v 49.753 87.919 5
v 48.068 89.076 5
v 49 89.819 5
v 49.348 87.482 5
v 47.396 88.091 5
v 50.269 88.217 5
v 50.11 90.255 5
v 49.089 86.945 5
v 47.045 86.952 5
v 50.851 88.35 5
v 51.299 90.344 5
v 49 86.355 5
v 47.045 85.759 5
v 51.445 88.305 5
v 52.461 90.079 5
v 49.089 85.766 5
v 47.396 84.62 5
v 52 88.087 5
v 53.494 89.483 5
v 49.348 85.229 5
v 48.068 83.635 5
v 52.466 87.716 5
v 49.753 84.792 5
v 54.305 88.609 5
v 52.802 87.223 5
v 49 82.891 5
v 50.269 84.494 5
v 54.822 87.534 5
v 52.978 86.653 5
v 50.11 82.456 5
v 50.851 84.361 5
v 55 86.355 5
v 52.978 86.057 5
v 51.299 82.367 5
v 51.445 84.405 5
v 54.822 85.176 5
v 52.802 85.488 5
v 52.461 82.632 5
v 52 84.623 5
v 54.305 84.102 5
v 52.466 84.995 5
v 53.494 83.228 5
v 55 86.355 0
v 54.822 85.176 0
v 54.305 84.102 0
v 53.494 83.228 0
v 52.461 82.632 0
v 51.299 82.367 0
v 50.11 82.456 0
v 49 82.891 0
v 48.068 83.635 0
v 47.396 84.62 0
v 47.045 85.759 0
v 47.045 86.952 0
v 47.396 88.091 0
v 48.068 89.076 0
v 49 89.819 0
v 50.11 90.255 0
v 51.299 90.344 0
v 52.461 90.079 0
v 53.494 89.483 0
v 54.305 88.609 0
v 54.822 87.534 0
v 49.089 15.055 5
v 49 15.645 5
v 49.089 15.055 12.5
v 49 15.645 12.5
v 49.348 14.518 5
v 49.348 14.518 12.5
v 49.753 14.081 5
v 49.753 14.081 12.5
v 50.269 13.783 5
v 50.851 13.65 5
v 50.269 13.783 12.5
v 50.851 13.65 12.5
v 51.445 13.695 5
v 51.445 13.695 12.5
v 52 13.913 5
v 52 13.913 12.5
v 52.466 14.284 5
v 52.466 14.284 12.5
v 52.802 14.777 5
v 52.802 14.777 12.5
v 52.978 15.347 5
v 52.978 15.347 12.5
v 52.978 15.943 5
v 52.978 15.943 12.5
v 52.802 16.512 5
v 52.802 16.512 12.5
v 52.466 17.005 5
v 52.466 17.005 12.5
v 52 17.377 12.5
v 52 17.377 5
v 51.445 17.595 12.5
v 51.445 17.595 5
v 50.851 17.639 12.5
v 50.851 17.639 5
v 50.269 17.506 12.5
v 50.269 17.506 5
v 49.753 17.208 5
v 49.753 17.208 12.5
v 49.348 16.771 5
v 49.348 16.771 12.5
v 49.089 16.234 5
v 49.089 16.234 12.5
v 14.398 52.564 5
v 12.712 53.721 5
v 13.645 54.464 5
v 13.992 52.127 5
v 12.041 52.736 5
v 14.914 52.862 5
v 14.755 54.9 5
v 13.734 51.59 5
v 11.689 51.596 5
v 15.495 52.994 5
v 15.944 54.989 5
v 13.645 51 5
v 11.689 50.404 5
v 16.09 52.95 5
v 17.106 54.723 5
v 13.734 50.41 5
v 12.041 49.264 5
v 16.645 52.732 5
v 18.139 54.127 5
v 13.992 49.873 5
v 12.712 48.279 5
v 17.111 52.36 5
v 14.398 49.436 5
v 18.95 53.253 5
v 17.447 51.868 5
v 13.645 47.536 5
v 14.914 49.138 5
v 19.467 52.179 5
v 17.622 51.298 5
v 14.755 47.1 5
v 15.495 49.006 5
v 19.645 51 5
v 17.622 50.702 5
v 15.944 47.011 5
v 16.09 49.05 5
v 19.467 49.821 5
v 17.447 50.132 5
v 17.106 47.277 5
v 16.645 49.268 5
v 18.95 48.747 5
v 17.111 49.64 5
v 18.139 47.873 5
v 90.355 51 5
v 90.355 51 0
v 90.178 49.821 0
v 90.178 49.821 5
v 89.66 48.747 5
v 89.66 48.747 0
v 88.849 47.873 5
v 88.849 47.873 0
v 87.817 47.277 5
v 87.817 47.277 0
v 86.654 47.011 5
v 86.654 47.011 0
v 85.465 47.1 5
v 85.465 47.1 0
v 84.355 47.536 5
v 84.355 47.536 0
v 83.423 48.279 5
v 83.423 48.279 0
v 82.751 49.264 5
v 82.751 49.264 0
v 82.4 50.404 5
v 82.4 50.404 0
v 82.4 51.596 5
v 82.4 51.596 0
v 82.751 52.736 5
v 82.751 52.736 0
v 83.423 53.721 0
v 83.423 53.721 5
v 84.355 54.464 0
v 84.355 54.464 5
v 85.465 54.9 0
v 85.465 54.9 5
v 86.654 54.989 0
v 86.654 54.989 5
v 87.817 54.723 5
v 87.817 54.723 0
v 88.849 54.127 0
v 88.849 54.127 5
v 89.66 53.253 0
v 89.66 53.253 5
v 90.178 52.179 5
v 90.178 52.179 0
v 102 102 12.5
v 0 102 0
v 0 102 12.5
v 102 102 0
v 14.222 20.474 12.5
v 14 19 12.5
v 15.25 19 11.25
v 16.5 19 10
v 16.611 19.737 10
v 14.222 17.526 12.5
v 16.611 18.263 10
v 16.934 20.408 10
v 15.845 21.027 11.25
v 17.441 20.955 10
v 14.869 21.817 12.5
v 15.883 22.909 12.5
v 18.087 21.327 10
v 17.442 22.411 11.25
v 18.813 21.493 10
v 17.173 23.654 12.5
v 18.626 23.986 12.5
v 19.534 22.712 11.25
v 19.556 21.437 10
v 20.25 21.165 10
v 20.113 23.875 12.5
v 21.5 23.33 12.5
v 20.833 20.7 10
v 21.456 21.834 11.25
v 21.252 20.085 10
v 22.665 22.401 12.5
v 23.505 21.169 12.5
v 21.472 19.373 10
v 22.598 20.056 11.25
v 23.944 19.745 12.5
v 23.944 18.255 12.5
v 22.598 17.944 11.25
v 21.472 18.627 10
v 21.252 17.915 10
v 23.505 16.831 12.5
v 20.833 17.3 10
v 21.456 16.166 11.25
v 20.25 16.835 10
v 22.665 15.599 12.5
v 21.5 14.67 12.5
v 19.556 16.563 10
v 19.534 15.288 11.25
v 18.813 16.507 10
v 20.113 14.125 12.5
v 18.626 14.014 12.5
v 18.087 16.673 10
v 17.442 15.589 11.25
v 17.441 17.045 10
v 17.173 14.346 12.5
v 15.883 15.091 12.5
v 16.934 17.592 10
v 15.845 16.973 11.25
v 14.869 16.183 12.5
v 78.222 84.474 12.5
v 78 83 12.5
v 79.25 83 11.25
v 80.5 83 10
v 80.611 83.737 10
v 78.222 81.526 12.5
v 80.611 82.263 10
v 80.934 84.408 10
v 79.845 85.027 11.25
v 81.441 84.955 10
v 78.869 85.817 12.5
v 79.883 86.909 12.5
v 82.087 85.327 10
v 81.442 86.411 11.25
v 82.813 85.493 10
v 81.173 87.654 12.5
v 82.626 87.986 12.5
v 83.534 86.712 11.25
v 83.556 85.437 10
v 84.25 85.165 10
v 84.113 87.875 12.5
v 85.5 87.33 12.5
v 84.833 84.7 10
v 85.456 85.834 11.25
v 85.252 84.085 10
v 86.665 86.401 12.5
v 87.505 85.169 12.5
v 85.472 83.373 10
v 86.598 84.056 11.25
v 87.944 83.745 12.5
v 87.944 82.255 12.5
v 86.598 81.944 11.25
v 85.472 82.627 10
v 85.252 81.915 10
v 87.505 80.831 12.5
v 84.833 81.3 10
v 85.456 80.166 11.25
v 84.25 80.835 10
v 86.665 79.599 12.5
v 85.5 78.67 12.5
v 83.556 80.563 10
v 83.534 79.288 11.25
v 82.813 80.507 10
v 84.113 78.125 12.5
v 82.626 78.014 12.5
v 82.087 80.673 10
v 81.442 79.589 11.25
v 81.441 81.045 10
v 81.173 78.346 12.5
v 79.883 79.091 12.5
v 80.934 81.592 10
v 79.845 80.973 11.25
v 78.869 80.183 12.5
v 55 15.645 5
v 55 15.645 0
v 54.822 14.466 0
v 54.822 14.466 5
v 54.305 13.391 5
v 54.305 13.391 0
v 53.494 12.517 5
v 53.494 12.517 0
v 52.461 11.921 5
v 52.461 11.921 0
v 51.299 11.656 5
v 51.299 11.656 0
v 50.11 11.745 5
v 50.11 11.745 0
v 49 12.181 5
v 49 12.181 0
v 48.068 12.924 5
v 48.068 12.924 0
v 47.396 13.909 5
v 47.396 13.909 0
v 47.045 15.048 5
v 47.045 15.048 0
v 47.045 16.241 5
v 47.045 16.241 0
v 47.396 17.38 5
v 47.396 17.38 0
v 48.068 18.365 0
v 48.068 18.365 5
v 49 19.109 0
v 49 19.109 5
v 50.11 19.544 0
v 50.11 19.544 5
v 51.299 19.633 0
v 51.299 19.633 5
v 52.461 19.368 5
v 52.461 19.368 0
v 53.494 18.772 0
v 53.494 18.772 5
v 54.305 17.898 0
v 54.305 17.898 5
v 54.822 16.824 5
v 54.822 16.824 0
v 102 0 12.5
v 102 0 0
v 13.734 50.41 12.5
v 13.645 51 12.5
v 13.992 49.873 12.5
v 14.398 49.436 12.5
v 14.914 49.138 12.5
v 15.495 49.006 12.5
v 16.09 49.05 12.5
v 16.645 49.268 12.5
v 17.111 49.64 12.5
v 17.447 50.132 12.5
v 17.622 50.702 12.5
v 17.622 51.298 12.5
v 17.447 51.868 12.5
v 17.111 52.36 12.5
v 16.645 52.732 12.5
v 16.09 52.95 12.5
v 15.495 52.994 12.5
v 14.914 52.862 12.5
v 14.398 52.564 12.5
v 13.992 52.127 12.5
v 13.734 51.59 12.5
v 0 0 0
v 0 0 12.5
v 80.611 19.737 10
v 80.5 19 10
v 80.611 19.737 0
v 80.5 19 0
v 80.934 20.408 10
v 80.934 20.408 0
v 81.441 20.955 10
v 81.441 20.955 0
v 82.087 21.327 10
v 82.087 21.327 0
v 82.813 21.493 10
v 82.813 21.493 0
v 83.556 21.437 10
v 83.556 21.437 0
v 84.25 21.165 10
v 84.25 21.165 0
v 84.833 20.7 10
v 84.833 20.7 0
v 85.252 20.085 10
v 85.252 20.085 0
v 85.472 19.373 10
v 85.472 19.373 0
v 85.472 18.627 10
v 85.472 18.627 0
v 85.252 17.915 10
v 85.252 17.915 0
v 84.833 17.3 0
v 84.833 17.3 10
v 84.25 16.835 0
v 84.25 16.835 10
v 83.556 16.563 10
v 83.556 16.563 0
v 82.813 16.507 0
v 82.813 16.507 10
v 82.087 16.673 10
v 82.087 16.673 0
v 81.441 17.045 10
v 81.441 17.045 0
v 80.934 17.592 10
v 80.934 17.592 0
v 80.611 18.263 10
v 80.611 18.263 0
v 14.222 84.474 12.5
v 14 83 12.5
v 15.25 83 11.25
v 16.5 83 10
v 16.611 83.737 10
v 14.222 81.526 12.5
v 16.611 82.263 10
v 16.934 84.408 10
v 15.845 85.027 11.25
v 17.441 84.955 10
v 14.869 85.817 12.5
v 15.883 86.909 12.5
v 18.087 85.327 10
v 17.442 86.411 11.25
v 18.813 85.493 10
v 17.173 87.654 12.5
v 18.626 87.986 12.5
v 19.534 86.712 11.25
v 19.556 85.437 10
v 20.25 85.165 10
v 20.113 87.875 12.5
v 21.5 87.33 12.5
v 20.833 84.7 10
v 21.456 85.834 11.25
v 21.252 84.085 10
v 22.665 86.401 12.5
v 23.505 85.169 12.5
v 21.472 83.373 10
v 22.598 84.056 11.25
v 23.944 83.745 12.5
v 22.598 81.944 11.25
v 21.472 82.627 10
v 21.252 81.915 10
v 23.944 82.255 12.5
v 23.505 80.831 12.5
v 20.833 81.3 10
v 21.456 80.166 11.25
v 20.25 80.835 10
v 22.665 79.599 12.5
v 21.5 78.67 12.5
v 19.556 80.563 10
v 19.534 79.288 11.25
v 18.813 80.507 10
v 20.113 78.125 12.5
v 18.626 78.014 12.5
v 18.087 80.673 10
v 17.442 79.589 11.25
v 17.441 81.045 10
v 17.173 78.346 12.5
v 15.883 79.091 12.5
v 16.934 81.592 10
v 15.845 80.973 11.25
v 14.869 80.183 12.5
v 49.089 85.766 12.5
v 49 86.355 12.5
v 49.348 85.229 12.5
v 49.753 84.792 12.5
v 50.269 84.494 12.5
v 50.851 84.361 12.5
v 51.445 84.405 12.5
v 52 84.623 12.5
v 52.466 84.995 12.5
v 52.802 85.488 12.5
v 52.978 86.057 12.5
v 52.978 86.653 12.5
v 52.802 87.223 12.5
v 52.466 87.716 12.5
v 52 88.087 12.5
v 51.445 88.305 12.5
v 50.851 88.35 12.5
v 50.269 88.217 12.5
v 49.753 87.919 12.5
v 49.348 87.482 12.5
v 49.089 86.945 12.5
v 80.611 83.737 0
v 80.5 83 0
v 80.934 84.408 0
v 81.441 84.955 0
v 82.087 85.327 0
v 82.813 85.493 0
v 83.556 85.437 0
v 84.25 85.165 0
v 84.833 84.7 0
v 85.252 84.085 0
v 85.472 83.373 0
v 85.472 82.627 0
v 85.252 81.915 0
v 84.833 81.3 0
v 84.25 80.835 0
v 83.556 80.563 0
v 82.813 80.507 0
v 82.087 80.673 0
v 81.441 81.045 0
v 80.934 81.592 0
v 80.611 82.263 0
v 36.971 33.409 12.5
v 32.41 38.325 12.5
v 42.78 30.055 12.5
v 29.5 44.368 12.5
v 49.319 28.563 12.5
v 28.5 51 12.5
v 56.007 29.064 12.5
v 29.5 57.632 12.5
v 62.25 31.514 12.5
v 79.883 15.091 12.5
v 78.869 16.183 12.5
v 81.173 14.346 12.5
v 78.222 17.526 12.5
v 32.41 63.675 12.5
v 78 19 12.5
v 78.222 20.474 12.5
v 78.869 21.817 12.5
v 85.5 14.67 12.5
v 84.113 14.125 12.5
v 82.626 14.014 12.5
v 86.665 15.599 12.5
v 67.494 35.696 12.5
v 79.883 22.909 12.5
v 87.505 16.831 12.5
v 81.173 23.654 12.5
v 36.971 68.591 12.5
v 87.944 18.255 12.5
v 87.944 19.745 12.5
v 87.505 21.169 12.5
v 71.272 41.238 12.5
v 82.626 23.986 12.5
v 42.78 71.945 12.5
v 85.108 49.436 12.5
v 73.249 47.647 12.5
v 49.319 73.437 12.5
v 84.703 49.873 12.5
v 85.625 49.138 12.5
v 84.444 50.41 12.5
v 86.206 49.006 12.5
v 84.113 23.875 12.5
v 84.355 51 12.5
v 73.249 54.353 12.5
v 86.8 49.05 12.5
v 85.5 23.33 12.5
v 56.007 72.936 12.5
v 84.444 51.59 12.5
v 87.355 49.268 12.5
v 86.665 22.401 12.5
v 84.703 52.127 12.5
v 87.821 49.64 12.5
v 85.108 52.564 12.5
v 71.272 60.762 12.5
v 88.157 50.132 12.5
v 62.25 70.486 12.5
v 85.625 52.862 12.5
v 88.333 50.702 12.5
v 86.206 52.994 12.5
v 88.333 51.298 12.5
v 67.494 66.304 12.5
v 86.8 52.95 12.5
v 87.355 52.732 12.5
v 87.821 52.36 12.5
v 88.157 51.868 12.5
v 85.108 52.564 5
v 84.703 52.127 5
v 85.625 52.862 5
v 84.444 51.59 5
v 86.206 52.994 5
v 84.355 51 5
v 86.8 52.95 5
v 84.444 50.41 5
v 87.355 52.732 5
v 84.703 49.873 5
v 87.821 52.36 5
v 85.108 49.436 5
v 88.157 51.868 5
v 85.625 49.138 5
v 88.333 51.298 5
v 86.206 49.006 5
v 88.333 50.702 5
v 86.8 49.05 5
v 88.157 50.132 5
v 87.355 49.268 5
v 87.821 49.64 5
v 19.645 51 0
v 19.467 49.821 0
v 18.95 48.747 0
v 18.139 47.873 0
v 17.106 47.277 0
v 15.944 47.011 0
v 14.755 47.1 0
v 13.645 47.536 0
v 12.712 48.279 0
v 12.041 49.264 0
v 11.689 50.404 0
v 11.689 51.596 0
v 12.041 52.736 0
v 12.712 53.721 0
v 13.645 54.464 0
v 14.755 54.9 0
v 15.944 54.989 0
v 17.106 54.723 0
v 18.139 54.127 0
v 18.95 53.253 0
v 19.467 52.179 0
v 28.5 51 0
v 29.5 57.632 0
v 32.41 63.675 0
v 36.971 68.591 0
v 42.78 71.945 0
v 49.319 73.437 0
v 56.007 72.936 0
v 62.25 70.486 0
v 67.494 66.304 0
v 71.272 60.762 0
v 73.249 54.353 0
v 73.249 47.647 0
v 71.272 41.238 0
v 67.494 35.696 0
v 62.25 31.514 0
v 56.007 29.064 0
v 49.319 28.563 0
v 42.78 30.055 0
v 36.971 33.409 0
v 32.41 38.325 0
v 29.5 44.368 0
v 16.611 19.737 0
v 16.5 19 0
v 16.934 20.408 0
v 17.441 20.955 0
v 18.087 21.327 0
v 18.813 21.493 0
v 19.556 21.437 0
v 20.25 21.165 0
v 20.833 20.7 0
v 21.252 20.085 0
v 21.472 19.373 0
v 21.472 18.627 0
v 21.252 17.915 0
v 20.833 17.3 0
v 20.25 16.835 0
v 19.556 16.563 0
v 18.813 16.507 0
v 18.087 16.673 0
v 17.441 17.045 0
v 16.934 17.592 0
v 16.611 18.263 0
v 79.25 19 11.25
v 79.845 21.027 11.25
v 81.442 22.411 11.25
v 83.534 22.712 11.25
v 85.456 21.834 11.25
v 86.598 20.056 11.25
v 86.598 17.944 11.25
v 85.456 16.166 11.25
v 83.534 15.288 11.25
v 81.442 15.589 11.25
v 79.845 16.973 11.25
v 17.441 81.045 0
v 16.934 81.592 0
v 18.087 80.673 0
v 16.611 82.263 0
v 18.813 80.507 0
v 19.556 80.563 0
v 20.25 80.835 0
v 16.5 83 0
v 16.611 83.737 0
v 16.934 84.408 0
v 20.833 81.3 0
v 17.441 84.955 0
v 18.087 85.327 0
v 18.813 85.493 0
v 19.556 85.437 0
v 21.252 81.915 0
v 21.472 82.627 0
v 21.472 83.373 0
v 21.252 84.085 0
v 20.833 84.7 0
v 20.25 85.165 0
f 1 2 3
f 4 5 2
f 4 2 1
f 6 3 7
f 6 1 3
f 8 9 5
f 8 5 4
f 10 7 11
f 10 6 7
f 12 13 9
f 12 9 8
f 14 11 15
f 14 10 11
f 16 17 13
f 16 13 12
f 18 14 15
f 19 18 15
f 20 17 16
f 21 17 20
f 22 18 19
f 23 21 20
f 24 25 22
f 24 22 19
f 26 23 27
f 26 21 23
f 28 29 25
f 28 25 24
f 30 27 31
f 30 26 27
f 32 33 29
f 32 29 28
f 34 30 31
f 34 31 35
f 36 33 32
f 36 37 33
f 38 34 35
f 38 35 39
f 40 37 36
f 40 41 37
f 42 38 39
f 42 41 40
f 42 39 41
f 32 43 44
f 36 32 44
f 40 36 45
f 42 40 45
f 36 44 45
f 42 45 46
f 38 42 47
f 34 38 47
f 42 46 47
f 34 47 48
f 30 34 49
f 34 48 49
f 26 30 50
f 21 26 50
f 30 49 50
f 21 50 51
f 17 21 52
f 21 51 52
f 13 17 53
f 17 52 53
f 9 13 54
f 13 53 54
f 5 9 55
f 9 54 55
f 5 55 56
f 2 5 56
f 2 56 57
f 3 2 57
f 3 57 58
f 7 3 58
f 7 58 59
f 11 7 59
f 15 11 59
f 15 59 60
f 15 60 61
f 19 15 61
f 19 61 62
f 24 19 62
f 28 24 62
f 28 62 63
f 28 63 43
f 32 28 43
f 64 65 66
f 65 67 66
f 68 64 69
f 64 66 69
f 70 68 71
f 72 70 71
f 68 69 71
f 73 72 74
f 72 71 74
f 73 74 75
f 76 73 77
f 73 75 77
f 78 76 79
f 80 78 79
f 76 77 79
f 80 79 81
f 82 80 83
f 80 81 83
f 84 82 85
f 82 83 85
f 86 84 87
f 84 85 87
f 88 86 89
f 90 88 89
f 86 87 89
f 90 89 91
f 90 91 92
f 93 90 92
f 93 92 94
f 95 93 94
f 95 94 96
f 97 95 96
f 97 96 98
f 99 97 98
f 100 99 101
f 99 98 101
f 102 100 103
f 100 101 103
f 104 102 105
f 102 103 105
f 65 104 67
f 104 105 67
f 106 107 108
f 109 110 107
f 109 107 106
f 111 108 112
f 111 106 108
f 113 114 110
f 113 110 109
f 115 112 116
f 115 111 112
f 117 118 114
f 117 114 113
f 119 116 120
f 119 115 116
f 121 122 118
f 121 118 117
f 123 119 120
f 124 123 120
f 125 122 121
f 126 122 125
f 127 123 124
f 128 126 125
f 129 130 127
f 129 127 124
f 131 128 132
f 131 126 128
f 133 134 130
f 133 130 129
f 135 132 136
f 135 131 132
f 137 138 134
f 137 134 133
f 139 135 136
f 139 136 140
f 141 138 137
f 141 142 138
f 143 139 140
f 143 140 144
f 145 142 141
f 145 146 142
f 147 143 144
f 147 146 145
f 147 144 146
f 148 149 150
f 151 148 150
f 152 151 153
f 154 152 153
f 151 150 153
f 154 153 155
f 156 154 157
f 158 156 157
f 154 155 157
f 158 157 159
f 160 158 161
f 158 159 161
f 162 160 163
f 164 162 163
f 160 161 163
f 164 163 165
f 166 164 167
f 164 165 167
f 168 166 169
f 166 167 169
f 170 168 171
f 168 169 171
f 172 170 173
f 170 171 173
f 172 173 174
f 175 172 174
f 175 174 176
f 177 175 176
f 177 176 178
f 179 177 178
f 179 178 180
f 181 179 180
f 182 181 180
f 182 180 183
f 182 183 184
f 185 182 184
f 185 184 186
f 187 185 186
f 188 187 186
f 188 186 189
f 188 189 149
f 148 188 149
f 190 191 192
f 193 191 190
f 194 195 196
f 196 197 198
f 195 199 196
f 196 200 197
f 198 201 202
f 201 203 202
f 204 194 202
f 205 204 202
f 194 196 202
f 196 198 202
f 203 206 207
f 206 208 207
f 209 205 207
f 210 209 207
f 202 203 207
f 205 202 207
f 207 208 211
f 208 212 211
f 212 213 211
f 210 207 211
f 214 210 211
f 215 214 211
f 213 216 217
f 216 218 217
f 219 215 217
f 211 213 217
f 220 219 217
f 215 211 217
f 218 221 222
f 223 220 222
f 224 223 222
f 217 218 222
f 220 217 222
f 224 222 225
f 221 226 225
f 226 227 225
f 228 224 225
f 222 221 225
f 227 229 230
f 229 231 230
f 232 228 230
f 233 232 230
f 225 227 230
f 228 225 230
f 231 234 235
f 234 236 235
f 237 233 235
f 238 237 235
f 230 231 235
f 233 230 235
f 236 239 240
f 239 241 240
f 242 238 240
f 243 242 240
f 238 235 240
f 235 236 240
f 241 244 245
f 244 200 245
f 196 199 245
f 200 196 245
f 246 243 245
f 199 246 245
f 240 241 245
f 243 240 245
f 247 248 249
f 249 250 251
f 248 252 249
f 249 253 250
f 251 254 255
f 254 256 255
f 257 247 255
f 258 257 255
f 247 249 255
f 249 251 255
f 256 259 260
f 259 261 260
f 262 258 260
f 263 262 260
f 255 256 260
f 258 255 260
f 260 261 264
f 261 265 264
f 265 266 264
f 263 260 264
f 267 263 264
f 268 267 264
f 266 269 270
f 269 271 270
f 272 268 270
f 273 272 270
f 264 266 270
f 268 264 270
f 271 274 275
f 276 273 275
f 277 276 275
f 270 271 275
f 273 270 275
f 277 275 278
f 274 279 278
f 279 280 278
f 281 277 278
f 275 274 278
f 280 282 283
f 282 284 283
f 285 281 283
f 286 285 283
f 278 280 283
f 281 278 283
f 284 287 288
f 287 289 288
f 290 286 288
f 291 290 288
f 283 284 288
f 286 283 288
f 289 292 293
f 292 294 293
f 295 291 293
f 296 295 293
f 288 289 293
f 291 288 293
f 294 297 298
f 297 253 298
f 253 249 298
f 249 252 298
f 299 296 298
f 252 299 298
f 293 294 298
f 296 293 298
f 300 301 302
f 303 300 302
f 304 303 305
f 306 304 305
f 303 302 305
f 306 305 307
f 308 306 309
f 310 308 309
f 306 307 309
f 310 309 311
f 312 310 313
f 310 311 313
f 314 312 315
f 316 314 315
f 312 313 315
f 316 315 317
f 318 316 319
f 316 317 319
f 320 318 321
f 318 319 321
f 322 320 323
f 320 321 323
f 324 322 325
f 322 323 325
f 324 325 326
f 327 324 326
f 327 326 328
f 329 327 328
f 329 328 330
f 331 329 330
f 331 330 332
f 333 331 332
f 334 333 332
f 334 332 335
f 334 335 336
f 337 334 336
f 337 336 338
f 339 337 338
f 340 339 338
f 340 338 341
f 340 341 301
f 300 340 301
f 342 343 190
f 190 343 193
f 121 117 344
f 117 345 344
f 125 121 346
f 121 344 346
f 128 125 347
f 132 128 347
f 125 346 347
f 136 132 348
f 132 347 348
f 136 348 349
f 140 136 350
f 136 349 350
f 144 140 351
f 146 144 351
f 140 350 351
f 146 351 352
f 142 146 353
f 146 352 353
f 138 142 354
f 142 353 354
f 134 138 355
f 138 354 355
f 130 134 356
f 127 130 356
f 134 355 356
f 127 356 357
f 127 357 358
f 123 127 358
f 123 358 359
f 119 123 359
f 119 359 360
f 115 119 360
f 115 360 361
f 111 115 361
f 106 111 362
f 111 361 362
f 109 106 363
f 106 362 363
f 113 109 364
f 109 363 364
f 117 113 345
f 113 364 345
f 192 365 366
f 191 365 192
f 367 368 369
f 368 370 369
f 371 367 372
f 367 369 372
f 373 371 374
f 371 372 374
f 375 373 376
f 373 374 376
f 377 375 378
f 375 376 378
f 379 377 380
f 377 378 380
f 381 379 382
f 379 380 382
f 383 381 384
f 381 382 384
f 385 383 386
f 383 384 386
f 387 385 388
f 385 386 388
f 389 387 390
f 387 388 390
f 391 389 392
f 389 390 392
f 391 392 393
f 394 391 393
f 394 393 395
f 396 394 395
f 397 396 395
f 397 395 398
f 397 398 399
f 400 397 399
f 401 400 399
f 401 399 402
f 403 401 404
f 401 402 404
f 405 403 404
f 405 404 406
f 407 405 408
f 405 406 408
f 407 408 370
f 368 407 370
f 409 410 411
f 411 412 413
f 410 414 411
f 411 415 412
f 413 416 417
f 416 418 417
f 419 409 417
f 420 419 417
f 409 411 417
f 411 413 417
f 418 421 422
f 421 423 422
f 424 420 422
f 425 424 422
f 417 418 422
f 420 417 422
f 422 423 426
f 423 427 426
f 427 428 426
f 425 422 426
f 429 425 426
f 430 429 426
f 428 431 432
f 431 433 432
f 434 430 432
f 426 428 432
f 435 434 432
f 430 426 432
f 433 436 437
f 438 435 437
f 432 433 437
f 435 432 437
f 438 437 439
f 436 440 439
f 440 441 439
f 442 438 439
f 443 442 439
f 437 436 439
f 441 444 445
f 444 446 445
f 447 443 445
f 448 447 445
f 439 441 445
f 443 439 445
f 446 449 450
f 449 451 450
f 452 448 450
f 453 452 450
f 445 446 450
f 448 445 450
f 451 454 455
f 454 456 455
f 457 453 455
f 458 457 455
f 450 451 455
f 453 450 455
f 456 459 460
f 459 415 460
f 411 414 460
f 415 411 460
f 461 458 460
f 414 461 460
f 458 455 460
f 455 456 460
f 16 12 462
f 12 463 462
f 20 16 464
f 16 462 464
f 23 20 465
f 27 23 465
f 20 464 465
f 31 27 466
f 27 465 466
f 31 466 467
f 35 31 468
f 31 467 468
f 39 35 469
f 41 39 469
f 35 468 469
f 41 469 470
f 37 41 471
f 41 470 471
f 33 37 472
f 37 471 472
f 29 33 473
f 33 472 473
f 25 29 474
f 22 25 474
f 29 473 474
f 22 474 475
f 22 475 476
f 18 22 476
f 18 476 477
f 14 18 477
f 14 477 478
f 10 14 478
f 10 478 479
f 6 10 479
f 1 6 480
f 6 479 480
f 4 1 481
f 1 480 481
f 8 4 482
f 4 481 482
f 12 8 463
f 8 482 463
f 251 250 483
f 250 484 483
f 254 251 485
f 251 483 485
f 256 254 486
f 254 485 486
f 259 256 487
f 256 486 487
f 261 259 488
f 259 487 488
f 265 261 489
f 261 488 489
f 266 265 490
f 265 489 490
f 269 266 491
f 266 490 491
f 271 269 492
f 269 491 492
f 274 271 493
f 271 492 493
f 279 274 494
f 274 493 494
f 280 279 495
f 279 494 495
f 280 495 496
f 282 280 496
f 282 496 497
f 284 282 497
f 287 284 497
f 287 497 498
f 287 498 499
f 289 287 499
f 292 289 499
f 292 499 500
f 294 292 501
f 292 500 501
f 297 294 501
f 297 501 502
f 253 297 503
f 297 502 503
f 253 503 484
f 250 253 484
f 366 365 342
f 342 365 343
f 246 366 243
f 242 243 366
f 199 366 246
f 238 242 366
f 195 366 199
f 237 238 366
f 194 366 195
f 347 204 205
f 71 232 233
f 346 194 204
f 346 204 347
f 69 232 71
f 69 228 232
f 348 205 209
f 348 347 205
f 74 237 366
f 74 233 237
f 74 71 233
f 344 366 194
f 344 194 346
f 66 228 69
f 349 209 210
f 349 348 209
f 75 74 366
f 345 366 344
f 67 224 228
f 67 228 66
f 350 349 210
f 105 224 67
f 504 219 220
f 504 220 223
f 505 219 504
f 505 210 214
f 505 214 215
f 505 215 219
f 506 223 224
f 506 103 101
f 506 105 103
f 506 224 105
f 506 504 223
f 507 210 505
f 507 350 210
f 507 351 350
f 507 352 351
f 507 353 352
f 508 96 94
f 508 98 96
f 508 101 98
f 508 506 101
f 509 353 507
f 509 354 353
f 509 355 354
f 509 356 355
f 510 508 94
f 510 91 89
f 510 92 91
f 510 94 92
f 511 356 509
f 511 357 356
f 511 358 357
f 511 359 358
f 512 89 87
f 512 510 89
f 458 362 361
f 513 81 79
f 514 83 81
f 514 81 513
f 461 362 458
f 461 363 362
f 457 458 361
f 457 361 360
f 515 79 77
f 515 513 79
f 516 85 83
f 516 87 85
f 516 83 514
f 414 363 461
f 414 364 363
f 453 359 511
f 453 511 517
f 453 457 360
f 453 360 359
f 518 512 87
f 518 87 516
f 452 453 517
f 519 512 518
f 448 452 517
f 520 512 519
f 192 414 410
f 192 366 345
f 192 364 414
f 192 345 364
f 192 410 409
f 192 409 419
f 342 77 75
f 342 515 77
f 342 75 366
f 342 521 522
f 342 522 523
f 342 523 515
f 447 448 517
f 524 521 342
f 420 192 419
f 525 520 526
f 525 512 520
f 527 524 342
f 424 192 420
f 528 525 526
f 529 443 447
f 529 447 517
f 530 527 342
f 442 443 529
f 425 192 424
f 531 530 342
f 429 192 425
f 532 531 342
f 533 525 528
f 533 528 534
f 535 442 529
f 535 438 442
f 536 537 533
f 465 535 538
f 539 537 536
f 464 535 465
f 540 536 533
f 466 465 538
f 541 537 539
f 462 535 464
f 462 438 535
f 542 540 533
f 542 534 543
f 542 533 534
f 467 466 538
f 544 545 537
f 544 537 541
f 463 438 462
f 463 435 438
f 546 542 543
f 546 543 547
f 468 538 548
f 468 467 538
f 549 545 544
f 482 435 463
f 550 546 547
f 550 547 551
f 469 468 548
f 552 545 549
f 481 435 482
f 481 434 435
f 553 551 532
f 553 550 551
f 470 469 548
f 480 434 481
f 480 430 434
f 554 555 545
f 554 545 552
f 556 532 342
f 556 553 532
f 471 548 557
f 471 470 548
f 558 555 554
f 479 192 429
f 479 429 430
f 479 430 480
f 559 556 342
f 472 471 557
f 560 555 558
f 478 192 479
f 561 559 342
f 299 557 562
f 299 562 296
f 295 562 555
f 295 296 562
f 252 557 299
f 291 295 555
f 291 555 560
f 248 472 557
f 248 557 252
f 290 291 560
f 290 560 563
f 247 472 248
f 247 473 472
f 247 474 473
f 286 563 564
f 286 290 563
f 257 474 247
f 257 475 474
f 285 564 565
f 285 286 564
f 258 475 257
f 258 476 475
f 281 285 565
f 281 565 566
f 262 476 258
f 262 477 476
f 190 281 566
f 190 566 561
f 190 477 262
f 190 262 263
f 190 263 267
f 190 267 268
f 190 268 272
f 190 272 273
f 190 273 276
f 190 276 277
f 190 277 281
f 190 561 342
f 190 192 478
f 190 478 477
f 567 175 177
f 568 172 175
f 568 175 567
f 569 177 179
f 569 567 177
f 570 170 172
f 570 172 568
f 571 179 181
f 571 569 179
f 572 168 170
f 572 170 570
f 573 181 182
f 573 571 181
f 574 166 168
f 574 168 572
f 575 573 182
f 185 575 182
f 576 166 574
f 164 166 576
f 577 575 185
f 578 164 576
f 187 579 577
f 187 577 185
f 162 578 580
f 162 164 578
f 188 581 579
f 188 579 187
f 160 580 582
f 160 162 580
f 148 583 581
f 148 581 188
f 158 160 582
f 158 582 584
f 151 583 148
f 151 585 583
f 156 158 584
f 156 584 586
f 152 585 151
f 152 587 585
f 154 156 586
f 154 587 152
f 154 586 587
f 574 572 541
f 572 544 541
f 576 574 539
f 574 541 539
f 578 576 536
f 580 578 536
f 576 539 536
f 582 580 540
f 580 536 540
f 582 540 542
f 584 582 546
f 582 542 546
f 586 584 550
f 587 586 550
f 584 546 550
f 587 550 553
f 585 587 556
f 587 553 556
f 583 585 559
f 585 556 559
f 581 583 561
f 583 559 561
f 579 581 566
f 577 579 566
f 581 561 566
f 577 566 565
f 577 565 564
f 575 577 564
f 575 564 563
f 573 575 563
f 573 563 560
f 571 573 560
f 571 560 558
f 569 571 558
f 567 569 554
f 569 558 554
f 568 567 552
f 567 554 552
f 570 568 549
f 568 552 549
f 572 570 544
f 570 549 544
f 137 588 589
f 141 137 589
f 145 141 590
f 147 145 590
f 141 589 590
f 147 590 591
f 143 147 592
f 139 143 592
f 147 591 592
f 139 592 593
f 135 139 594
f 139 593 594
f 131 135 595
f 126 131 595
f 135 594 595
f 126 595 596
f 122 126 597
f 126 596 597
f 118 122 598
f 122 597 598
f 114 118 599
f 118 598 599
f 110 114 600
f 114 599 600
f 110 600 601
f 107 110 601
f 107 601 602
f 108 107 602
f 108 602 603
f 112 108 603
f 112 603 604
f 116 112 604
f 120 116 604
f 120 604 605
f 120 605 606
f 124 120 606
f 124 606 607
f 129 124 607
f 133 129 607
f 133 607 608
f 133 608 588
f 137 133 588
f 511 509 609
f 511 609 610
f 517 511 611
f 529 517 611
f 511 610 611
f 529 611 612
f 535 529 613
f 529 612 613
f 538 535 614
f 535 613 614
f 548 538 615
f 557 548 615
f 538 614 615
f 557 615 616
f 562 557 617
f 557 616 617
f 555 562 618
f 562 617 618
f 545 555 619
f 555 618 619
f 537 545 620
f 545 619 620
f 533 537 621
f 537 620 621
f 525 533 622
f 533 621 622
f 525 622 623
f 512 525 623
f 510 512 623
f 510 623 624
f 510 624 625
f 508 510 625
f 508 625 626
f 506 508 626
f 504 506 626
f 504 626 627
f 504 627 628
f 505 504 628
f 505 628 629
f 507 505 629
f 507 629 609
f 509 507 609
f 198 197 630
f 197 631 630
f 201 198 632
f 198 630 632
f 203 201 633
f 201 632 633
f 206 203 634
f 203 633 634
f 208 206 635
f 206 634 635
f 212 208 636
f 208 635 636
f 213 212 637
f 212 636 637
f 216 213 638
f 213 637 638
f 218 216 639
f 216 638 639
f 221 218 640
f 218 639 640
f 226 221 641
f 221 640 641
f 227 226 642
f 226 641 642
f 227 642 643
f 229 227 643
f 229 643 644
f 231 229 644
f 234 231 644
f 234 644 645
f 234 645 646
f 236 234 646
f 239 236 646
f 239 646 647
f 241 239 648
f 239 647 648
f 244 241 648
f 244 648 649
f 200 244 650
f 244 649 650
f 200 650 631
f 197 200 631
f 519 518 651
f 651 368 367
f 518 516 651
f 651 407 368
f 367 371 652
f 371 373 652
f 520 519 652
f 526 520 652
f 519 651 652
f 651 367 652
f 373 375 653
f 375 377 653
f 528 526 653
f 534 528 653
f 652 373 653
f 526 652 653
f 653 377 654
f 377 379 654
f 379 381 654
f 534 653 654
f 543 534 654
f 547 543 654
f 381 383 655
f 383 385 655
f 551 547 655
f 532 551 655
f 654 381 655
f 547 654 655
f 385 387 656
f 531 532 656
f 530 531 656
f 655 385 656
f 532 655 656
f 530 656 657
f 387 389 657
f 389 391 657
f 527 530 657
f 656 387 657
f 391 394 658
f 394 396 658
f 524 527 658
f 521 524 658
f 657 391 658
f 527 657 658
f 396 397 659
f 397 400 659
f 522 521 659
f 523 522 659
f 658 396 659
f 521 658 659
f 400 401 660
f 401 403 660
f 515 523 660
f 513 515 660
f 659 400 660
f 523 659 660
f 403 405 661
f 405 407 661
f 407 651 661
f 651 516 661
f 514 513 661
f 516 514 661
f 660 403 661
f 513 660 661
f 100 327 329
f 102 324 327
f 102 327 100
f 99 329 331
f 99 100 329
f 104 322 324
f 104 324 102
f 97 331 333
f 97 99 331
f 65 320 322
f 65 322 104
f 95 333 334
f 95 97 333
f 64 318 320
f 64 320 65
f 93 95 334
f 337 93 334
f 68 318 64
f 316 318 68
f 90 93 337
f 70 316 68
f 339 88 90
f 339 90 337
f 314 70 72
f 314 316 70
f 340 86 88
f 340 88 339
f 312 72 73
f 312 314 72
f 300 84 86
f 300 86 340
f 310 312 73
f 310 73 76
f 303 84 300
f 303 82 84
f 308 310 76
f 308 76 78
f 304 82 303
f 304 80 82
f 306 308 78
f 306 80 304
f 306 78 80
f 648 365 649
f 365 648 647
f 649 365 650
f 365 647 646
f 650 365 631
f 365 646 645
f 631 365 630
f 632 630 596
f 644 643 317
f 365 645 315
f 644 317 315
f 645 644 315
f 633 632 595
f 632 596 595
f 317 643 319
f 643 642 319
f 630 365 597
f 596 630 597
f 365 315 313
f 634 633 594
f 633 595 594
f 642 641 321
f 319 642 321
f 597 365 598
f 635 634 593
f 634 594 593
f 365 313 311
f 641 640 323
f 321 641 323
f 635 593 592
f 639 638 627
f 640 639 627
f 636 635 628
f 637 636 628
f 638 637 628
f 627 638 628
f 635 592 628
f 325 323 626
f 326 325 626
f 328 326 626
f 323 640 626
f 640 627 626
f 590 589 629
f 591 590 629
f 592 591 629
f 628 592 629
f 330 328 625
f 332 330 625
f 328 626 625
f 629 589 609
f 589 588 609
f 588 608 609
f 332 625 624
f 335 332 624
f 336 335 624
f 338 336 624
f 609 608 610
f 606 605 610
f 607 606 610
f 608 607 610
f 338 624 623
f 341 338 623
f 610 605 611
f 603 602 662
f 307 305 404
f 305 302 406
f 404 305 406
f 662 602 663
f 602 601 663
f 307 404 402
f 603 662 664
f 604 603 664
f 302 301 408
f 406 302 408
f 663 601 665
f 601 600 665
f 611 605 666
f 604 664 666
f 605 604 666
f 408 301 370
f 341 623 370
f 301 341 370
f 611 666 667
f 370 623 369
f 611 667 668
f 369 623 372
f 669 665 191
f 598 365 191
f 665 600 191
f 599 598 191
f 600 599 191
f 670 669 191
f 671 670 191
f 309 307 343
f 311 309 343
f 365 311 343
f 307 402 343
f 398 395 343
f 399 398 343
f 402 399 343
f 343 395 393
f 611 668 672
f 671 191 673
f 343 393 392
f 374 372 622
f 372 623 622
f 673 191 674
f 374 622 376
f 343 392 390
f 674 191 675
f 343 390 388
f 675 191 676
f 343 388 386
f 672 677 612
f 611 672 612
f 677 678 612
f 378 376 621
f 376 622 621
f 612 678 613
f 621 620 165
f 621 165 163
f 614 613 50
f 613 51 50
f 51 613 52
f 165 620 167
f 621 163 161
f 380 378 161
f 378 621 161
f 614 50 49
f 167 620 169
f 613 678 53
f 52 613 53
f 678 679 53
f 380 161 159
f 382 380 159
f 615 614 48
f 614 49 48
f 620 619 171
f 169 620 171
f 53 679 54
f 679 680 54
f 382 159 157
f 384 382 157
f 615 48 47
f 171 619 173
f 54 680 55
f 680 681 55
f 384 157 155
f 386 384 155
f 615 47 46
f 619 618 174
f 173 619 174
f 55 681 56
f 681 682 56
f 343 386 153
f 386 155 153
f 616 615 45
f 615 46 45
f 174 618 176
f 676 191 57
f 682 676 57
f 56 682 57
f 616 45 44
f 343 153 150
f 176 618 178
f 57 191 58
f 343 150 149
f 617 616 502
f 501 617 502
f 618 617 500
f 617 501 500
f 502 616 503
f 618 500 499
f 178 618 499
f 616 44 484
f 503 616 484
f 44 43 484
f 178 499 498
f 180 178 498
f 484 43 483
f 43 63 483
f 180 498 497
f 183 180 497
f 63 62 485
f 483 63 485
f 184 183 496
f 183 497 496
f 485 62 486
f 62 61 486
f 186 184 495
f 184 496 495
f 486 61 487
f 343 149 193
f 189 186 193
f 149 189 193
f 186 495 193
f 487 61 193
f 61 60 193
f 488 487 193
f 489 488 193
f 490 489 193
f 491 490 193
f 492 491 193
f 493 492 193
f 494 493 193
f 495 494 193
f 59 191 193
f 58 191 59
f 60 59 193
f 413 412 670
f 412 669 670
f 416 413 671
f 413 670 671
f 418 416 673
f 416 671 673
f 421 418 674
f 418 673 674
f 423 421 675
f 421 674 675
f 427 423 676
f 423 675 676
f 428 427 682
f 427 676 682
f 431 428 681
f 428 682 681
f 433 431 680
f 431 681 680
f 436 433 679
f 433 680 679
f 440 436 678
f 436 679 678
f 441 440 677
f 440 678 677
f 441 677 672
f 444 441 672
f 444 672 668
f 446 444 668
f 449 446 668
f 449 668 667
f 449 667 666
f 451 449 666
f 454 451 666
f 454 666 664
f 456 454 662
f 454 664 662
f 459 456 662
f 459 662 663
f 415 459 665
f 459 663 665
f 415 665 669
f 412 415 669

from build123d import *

# Parameters (mm, degrees)
F3_W           = 102
F3_H           = 102
F4_DEPTH       = 12.5
F5_D           = 45
F1_D           = 5
F1_CSINK_D     = 10
F1_CSINK_ANGLE = 90
F2_D           = 5
F2_CSINK_D     = 10
F2_CSINK_ANGLE = 90
F8_D           = 4
F8_CBORE_D     = 8
F8_CBORE_DEPTH = 5


with BuildPart() as f4:
    # F3 (on Top) → F4 (new body)
    with BuildSketch(Plane.XY):
        with Locations((51, 51)):
            Rectangle(F3_W, F3_H)
    extrude(amount=F4_DEPTH)

    # F5 (through all)
    with Locations(Plane.XY.offset(12.5)):
        with Locations((51, 51)):
            Hole(F5_D / 2)

    # F1 (through all)
    with Locations(Plane.XY.offset(12.5)):
        with Locations((19, 19)):
            CounterSinkHole(F1_D / 2, F1_CSINK_D / 2, counter_sink_angle=F1_CSINK_ANGLE)

    # F2 (through all)
    with Locations(Plane.XY.offset(12.5)):
        with Locations((83, 83), (19, 83), (83, 19)):
            CounterSinkHole(F2_D / 2, F2_CSINK_D / 2, counter_sink_angle=F2_CSINK_ANGLE)

    # F8 (through all)
    with Locations(Plane(origin=(0, 0, 0), x_dir=(1, 0, 0), z_dir=(0, 0, -1))):
        with Locations((15.644661, -51), (51, -15.644661), (86.355339, -51), (51, -86.355339)):
            CounterBoreHole(F8_D / 2, F8_CBORE_D / 2, F8_CBORE_DEPTH)


solid = f4.part
